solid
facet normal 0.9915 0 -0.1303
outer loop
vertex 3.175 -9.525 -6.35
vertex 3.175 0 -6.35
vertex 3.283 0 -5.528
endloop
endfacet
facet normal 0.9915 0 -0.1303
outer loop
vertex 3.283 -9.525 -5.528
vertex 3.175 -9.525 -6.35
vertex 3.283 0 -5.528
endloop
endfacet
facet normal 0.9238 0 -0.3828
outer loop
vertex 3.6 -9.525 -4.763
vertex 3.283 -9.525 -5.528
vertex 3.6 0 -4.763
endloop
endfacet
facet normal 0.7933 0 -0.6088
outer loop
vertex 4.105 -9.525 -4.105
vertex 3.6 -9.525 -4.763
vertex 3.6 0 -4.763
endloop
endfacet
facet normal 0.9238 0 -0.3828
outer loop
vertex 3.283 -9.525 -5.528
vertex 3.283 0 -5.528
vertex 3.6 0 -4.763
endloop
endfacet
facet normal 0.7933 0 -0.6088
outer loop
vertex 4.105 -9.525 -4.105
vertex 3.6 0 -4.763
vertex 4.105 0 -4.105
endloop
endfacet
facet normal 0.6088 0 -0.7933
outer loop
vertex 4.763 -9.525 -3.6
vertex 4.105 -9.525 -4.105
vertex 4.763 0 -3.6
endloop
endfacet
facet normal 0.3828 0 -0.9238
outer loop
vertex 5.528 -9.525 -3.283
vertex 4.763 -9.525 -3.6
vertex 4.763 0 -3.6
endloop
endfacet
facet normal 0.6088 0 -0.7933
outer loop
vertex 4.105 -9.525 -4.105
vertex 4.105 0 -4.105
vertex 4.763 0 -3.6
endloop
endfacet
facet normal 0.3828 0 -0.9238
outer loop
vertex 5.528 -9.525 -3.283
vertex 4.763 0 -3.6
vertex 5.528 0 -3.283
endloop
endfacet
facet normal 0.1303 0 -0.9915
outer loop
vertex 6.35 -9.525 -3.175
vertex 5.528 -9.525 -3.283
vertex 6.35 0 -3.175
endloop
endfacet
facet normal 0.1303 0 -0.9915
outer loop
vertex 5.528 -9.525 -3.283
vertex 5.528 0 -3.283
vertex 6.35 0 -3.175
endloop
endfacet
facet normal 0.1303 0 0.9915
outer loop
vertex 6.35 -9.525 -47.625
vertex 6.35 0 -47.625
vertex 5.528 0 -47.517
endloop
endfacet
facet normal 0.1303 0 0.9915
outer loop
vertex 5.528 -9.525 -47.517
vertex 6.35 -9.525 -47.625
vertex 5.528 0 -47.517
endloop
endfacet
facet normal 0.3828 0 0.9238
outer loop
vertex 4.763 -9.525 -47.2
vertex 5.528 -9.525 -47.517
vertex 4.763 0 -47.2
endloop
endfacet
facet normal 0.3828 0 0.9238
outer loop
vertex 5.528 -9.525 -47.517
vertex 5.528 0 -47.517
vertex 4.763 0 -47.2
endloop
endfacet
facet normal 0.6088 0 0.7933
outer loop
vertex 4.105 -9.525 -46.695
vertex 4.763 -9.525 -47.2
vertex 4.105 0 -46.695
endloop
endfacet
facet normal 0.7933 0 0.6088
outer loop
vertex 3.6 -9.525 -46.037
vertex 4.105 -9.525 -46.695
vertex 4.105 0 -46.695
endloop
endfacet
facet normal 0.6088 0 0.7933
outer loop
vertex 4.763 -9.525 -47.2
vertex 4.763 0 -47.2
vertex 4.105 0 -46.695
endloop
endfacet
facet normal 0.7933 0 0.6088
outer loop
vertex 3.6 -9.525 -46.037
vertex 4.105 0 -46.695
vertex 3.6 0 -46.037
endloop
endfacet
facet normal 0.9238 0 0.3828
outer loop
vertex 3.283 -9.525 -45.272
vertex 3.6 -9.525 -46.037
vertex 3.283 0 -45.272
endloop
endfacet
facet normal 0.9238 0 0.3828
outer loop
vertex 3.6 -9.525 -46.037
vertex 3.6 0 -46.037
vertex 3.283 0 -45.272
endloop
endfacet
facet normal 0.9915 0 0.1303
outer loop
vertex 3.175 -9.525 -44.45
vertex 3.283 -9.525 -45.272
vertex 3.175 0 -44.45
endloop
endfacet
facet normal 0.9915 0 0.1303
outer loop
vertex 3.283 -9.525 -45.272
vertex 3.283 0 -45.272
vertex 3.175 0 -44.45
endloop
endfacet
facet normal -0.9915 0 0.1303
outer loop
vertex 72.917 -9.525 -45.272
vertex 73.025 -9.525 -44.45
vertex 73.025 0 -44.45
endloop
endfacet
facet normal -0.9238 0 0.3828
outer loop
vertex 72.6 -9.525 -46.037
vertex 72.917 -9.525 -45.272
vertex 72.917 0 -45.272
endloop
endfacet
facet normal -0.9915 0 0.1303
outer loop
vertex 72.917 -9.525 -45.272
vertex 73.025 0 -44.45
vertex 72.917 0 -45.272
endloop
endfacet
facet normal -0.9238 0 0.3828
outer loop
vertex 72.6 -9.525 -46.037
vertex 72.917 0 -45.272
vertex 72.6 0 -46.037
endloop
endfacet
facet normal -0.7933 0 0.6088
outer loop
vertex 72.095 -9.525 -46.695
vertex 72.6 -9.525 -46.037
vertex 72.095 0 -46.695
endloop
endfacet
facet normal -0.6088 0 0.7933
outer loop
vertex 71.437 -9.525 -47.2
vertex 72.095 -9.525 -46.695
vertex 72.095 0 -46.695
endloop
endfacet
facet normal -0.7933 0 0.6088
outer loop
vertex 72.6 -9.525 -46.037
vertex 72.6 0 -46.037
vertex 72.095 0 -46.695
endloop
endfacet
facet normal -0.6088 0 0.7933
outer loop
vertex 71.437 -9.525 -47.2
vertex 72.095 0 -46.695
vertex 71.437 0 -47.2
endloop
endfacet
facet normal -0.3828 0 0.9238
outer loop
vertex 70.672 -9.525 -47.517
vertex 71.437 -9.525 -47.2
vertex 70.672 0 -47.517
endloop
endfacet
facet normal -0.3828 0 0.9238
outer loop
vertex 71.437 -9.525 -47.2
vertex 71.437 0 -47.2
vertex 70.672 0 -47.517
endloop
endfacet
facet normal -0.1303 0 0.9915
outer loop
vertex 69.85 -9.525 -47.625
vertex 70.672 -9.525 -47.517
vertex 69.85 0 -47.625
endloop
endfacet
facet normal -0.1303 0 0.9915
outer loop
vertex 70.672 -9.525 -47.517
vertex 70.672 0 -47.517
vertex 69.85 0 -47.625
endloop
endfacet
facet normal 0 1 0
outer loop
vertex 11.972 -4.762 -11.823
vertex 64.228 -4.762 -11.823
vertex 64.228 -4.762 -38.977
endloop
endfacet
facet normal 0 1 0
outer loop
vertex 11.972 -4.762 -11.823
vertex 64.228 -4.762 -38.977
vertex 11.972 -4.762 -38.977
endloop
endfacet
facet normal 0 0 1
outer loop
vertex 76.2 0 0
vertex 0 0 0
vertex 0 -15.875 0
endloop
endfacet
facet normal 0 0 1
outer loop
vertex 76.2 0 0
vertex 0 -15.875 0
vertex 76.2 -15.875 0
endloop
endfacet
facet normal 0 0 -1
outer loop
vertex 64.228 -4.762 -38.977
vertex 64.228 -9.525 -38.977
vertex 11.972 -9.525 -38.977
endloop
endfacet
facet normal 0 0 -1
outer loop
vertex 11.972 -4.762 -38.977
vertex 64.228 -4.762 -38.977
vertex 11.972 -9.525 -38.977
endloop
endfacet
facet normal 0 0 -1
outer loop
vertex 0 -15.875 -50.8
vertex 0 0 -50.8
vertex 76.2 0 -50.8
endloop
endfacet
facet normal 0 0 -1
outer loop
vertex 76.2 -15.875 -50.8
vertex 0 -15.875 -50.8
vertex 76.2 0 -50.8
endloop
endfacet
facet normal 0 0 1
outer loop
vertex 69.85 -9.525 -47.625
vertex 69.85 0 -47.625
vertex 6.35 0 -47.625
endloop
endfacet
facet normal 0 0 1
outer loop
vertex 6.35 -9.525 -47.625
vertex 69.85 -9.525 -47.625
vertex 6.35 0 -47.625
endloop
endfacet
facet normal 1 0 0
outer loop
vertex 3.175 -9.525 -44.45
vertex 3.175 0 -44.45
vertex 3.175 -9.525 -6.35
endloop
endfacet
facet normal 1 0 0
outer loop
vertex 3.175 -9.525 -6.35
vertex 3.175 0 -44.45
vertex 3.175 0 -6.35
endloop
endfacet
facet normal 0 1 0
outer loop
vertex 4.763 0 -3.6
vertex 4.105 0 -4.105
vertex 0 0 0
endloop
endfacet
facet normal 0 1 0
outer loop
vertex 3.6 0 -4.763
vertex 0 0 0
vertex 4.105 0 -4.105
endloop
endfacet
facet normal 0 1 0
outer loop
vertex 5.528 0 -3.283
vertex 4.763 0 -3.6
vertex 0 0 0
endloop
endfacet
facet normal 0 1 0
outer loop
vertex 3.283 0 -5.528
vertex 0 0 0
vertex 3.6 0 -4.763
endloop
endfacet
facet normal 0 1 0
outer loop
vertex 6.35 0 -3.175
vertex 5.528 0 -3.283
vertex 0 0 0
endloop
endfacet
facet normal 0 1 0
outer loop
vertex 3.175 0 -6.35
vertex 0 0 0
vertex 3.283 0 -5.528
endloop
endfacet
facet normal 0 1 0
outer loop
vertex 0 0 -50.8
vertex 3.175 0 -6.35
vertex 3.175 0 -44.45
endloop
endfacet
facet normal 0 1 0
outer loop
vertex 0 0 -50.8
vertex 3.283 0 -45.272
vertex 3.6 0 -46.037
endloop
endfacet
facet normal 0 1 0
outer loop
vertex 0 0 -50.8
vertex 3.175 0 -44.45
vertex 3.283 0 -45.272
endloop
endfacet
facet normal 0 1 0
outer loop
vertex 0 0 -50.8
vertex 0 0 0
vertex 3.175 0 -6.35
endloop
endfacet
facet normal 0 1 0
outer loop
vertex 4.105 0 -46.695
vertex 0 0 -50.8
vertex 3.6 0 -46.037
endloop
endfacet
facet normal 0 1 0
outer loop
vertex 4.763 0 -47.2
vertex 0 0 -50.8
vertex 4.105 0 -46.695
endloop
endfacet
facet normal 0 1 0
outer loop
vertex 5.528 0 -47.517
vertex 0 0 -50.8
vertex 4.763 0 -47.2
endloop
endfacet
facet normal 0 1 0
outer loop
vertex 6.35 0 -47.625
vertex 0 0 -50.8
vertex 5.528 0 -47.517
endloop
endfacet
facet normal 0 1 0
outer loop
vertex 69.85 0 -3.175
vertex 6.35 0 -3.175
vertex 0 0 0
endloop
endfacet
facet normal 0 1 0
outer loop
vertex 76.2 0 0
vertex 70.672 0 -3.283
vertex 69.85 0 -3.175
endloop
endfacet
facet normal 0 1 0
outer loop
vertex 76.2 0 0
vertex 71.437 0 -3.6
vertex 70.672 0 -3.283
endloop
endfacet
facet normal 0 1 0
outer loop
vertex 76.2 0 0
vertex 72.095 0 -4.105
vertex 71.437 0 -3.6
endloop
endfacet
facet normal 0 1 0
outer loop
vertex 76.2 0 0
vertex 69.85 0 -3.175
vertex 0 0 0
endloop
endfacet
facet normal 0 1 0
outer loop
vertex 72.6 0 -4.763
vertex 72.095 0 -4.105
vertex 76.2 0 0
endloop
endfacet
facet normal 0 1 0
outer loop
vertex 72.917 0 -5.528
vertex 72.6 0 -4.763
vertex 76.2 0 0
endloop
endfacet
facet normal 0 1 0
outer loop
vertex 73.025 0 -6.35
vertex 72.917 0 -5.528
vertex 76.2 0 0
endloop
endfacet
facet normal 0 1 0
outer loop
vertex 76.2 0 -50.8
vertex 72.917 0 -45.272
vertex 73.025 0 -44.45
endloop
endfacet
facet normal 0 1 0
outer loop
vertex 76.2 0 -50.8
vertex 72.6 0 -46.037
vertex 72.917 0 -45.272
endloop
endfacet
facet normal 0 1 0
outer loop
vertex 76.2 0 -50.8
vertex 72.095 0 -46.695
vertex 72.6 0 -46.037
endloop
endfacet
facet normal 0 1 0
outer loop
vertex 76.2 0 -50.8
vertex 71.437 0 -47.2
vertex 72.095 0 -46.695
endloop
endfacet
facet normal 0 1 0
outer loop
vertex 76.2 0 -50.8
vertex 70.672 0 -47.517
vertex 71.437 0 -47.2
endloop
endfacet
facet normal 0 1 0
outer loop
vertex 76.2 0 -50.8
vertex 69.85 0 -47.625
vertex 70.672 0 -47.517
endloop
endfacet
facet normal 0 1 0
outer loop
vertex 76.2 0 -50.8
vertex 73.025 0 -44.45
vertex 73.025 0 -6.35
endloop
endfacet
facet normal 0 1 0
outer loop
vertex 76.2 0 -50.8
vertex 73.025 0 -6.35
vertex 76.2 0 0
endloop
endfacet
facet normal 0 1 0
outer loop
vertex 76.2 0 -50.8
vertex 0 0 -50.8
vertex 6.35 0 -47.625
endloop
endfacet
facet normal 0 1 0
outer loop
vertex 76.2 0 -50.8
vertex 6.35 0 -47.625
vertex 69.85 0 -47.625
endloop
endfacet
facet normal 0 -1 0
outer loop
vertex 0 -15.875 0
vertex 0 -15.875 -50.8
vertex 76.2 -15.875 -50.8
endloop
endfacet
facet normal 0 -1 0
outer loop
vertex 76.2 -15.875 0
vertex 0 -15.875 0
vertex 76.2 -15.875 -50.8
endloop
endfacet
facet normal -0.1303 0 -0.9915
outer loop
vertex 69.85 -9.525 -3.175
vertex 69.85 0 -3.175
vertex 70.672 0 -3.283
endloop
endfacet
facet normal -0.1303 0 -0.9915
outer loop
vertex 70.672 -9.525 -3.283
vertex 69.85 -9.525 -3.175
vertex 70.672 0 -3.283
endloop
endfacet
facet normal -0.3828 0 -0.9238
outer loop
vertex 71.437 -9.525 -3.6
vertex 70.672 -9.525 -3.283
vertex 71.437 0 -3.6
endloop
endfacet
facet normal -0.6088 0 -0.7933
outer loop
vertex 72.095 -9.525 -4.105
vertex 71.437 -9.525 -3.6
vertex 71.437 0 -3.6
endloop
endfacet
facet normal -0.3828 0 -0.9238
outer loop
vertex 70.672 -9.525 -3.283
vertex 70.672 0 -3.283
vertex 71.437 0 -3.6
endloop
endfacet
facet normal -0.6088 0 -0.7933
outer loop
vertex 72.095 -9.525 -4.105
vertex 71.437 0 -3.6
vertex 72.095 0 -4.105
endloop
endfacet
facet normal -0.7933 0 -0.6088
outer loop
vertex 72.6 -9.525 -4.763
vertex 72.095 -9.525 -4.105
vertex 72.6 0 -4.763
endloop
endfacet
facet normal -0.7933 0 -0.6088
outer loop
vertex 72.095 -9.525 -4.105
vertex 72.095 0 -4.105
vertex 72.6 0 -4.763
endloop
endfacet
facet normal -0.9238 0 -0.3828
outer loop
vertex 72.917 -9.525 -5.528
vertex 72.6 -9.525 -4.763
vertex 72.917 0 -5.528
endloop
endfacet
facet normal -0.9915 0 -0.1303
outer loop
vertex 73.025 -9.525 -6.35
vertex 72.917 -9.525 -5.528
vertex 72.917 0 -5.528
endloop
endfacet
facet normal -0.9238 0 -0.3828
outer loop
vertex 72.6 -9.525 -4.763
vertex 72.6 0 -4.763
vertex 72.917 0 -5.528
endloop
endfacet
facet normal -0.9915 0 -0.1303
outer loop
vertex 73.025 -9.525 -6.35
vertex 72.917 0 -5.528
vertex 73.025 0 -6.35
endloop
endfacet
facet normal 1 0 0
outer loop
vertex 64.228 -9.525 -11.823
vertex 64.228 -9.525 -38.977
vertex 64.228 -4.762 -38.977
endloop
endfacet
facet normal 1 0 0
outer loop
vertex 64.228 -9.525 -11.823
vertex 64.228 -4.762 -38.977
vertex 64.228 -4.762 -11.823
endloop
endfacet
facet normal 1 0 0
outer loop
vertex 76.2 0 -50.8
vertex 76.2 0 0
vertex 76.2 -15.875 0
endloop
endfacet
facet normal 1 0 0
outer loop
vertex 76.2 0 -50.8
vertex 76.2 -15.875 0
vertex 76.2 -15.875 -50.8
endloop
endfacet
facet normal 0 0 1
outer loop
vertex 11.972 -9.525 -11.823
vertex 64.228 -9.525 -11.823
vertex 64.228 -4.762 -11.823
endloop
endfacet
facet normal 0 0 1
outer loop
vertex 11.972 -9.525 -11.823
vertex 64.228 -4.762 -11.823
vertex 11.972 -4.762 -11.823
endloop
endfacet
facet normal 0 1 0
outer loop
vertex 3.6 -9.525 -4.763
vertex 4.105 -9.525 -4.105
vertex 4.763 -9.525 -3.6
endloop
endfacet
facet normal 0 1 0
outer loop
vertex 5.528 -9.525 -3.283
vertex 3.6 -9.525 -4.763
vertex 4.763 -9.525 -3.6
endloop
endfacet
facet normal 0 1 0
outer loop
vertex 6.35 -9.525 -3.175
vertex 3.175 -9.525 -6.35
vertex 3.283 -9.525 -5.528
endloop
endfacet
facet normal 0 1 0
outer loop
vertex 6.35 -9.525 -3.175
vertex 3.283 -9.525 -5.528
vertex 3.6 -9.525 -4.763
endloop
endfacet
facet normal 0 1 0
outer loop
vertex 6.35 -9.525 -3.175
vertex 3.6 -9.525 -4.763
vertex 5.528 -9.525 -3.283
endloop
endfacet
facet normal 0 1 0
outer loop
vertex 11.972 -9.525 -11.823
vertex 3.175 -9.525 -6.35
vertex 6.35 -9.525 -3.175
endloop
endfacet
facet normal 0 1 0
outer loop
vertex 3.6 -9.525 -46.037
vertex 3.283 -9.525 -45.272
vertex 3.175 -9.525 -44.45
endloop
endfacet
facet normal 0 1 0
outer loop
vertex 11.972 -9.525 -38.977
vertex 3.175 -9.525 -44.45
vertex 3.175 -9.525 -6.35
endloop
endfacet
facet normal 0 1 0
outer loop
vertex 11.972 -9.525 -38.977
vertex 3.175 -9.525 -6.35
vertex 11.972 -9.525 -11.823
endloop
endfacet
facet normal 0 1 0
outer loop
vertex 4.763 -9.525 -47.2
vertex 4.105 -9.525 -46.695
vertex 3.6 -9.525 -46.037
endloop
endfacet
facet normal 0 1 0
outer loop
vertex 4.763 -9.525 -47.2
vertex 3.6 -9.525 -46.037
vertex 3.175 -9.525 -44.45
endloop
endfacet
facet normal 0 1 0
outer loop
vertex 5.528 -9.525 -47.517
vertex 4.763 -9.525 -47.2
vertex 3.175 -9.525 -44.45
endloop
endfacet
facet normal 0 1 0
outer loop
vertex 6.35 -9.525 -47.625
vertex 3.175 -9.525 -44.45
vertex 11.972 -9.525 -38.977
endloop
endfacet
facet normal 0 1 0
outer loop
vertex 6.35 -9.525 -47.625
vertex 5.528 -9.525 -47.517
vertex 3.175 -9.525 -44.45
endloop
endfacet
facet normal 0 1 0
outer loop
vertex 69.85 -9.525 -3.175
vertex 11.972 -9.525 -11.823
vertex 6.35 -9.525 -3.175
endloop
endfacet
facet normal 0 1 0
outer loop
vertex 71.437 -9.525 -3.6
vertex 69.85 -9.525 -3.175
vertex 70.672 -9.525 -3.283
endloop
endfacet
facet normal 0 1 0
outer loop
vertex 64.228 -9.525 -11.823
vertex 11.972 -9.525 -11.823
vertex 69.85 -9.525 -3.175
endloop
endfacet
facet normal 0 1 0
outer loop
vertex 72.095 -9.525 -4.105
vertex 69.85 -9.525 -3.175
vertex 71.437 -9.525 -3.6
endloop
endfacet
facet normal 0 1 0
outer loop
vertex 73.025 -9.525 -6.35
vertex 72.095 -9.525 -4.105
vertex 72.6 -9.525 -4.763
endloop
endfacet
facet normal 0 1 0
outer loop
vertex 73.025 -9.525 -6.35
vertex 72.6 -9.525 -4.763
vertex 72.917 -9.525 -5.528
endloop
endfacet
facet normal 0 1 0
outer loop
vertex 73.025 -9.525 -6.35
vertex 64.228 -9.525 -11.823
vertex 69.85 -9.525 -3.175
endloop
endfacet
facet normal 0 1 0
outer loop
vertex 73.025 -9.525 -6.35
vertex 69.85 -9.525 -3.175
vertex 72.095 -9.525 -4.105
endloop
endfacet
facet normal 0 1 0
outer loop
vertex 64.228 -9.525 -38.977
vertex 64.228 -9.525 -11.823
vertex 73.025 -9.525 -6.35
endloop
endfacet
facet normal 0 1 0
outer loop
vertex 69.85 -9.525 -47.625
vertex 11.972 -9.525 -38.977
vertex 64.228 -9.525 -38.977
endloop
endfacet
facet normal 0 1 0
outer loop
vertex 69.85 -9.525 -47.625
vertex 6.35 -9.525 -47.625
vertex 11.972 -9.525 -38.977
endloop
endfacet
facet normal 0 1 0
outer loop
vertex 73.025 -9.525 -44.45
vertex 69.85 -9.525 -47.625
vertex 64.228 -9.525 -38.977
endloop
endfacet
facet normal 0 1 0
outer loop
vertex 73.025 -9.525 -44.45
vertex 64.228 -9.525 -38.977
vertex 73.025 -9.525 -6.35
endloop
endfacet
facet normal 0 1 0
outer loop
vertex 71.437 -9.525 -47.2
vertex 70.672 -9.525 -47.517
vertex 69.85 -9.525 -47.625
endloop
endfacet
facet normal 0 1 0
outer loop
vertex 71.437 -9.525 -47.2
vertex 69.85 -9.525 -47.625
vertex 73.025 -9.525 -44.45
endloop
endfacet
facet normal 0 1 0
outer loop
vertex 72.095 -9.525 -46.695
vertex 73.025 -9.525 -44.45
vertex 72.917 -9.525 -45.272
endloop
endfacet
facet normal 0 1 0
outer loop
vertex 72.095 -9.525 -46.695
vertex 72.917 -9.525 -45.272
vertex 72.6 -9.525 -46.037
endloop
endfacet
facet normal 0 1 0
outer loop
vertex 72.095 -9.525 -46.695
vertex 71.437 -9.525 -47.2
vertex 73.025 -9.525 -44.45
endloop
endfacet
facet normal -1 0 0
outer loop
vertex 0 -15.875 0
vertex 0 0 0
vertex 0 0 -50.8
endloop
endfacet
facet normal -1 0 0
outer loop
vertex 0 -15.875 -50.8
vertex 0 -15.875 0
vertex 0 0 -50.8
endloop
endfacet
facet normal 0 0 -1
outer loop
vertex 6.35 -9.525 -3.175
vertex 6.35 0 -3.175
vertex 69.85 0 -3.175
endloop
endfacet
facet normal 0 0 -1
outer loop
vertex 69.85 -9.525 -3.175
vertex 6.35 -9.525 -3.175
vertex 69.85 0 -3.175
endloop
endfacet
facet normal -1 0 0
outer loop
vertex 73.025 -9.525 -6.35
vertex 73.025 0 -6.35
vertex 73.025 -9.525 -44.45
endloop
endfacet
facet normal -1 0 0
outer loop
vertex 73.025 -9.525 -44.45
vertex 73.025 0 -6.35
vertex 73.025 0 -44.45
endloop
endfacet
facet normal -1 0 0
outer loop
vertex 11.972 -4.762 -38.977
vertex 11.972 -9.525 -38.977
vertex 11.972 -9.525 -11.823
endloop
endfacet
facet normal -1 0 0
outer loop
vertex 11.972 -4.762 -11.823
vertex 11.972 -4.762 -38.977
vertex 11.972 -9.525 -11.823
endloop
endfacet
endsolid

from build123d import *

# Parameters (mm, degrees)
SKETCH4_W      = 76.2
SKETCH4_H      = 50.8
EXTRUDE2_DEPTH = 15.875
EXTRUDE3_DEPTH = 9.525
SKETCH6_W      = 52.256418226
SKETCH6_H      = 27.153557036
EXTRUDE4_DEPTH = 4.7625


with BuildPart() as part:
    # Sketch4 → Extrude2 (new body)
    with BuildSketch(Plane(origin=(0, 0, 0), x_dir=(1, 0, 0), z_dir=(0, 1, 0))):
        with Locations((38.1, 25.4)):
            Rectangle(SKETCH4_W, SKETCH4_H)
    extrude(amount=-EXTRUDE2_DEPTH)

    # Sketch5 → Extrude3 (cut)
    with BuildSketch(Plane(origin=(0, 0, 0), x_dir=(1, 0, 0), z_dir=(0, 1, 0))):
        with BuildLine():
            Line((3.175, 44.45), (3.175, 6.35))
            ThreePointArc((3.175, 6.35), (4.10493597, 4.10493597), (6.35, 3.175))
            Line((6.35, 3.175), (69.85, 3.175))
            ThreePointArc((69.85, 3.175), (72.09506403, 4.10493597), (73.025, 6.35))
            Line((73.025, 6.35), (73.025, 44.45))
            ThreePointArc((73.025, 44.45), (72.09506403, 46.69506403), (69.85, 47.625))
            Line((69.85, 47.625), (6.35, 47.625))
            ThreePointArc((6.35, 47.625), (4.10493597, 46.69506403), (3.175, 44.45))
        make_face()
    extrude(amount=-EXTRUDE3_DEPTH, mode=Mode.SUBTRACT)

    # Sketch6 → Extrude4 (add)
    with BuildSketch(Plane(origin=(0, -9.525, 0), x_dir=(-1, 0, 0), z_dir=(0, 1, 0))):
        with Locations((-38.1, -25.4)):
            Rectangle(SKETCH6_W, SKETCH6_H)
    extrude(amount=EXTRUDE4_DEPTH)


solid = part.part
